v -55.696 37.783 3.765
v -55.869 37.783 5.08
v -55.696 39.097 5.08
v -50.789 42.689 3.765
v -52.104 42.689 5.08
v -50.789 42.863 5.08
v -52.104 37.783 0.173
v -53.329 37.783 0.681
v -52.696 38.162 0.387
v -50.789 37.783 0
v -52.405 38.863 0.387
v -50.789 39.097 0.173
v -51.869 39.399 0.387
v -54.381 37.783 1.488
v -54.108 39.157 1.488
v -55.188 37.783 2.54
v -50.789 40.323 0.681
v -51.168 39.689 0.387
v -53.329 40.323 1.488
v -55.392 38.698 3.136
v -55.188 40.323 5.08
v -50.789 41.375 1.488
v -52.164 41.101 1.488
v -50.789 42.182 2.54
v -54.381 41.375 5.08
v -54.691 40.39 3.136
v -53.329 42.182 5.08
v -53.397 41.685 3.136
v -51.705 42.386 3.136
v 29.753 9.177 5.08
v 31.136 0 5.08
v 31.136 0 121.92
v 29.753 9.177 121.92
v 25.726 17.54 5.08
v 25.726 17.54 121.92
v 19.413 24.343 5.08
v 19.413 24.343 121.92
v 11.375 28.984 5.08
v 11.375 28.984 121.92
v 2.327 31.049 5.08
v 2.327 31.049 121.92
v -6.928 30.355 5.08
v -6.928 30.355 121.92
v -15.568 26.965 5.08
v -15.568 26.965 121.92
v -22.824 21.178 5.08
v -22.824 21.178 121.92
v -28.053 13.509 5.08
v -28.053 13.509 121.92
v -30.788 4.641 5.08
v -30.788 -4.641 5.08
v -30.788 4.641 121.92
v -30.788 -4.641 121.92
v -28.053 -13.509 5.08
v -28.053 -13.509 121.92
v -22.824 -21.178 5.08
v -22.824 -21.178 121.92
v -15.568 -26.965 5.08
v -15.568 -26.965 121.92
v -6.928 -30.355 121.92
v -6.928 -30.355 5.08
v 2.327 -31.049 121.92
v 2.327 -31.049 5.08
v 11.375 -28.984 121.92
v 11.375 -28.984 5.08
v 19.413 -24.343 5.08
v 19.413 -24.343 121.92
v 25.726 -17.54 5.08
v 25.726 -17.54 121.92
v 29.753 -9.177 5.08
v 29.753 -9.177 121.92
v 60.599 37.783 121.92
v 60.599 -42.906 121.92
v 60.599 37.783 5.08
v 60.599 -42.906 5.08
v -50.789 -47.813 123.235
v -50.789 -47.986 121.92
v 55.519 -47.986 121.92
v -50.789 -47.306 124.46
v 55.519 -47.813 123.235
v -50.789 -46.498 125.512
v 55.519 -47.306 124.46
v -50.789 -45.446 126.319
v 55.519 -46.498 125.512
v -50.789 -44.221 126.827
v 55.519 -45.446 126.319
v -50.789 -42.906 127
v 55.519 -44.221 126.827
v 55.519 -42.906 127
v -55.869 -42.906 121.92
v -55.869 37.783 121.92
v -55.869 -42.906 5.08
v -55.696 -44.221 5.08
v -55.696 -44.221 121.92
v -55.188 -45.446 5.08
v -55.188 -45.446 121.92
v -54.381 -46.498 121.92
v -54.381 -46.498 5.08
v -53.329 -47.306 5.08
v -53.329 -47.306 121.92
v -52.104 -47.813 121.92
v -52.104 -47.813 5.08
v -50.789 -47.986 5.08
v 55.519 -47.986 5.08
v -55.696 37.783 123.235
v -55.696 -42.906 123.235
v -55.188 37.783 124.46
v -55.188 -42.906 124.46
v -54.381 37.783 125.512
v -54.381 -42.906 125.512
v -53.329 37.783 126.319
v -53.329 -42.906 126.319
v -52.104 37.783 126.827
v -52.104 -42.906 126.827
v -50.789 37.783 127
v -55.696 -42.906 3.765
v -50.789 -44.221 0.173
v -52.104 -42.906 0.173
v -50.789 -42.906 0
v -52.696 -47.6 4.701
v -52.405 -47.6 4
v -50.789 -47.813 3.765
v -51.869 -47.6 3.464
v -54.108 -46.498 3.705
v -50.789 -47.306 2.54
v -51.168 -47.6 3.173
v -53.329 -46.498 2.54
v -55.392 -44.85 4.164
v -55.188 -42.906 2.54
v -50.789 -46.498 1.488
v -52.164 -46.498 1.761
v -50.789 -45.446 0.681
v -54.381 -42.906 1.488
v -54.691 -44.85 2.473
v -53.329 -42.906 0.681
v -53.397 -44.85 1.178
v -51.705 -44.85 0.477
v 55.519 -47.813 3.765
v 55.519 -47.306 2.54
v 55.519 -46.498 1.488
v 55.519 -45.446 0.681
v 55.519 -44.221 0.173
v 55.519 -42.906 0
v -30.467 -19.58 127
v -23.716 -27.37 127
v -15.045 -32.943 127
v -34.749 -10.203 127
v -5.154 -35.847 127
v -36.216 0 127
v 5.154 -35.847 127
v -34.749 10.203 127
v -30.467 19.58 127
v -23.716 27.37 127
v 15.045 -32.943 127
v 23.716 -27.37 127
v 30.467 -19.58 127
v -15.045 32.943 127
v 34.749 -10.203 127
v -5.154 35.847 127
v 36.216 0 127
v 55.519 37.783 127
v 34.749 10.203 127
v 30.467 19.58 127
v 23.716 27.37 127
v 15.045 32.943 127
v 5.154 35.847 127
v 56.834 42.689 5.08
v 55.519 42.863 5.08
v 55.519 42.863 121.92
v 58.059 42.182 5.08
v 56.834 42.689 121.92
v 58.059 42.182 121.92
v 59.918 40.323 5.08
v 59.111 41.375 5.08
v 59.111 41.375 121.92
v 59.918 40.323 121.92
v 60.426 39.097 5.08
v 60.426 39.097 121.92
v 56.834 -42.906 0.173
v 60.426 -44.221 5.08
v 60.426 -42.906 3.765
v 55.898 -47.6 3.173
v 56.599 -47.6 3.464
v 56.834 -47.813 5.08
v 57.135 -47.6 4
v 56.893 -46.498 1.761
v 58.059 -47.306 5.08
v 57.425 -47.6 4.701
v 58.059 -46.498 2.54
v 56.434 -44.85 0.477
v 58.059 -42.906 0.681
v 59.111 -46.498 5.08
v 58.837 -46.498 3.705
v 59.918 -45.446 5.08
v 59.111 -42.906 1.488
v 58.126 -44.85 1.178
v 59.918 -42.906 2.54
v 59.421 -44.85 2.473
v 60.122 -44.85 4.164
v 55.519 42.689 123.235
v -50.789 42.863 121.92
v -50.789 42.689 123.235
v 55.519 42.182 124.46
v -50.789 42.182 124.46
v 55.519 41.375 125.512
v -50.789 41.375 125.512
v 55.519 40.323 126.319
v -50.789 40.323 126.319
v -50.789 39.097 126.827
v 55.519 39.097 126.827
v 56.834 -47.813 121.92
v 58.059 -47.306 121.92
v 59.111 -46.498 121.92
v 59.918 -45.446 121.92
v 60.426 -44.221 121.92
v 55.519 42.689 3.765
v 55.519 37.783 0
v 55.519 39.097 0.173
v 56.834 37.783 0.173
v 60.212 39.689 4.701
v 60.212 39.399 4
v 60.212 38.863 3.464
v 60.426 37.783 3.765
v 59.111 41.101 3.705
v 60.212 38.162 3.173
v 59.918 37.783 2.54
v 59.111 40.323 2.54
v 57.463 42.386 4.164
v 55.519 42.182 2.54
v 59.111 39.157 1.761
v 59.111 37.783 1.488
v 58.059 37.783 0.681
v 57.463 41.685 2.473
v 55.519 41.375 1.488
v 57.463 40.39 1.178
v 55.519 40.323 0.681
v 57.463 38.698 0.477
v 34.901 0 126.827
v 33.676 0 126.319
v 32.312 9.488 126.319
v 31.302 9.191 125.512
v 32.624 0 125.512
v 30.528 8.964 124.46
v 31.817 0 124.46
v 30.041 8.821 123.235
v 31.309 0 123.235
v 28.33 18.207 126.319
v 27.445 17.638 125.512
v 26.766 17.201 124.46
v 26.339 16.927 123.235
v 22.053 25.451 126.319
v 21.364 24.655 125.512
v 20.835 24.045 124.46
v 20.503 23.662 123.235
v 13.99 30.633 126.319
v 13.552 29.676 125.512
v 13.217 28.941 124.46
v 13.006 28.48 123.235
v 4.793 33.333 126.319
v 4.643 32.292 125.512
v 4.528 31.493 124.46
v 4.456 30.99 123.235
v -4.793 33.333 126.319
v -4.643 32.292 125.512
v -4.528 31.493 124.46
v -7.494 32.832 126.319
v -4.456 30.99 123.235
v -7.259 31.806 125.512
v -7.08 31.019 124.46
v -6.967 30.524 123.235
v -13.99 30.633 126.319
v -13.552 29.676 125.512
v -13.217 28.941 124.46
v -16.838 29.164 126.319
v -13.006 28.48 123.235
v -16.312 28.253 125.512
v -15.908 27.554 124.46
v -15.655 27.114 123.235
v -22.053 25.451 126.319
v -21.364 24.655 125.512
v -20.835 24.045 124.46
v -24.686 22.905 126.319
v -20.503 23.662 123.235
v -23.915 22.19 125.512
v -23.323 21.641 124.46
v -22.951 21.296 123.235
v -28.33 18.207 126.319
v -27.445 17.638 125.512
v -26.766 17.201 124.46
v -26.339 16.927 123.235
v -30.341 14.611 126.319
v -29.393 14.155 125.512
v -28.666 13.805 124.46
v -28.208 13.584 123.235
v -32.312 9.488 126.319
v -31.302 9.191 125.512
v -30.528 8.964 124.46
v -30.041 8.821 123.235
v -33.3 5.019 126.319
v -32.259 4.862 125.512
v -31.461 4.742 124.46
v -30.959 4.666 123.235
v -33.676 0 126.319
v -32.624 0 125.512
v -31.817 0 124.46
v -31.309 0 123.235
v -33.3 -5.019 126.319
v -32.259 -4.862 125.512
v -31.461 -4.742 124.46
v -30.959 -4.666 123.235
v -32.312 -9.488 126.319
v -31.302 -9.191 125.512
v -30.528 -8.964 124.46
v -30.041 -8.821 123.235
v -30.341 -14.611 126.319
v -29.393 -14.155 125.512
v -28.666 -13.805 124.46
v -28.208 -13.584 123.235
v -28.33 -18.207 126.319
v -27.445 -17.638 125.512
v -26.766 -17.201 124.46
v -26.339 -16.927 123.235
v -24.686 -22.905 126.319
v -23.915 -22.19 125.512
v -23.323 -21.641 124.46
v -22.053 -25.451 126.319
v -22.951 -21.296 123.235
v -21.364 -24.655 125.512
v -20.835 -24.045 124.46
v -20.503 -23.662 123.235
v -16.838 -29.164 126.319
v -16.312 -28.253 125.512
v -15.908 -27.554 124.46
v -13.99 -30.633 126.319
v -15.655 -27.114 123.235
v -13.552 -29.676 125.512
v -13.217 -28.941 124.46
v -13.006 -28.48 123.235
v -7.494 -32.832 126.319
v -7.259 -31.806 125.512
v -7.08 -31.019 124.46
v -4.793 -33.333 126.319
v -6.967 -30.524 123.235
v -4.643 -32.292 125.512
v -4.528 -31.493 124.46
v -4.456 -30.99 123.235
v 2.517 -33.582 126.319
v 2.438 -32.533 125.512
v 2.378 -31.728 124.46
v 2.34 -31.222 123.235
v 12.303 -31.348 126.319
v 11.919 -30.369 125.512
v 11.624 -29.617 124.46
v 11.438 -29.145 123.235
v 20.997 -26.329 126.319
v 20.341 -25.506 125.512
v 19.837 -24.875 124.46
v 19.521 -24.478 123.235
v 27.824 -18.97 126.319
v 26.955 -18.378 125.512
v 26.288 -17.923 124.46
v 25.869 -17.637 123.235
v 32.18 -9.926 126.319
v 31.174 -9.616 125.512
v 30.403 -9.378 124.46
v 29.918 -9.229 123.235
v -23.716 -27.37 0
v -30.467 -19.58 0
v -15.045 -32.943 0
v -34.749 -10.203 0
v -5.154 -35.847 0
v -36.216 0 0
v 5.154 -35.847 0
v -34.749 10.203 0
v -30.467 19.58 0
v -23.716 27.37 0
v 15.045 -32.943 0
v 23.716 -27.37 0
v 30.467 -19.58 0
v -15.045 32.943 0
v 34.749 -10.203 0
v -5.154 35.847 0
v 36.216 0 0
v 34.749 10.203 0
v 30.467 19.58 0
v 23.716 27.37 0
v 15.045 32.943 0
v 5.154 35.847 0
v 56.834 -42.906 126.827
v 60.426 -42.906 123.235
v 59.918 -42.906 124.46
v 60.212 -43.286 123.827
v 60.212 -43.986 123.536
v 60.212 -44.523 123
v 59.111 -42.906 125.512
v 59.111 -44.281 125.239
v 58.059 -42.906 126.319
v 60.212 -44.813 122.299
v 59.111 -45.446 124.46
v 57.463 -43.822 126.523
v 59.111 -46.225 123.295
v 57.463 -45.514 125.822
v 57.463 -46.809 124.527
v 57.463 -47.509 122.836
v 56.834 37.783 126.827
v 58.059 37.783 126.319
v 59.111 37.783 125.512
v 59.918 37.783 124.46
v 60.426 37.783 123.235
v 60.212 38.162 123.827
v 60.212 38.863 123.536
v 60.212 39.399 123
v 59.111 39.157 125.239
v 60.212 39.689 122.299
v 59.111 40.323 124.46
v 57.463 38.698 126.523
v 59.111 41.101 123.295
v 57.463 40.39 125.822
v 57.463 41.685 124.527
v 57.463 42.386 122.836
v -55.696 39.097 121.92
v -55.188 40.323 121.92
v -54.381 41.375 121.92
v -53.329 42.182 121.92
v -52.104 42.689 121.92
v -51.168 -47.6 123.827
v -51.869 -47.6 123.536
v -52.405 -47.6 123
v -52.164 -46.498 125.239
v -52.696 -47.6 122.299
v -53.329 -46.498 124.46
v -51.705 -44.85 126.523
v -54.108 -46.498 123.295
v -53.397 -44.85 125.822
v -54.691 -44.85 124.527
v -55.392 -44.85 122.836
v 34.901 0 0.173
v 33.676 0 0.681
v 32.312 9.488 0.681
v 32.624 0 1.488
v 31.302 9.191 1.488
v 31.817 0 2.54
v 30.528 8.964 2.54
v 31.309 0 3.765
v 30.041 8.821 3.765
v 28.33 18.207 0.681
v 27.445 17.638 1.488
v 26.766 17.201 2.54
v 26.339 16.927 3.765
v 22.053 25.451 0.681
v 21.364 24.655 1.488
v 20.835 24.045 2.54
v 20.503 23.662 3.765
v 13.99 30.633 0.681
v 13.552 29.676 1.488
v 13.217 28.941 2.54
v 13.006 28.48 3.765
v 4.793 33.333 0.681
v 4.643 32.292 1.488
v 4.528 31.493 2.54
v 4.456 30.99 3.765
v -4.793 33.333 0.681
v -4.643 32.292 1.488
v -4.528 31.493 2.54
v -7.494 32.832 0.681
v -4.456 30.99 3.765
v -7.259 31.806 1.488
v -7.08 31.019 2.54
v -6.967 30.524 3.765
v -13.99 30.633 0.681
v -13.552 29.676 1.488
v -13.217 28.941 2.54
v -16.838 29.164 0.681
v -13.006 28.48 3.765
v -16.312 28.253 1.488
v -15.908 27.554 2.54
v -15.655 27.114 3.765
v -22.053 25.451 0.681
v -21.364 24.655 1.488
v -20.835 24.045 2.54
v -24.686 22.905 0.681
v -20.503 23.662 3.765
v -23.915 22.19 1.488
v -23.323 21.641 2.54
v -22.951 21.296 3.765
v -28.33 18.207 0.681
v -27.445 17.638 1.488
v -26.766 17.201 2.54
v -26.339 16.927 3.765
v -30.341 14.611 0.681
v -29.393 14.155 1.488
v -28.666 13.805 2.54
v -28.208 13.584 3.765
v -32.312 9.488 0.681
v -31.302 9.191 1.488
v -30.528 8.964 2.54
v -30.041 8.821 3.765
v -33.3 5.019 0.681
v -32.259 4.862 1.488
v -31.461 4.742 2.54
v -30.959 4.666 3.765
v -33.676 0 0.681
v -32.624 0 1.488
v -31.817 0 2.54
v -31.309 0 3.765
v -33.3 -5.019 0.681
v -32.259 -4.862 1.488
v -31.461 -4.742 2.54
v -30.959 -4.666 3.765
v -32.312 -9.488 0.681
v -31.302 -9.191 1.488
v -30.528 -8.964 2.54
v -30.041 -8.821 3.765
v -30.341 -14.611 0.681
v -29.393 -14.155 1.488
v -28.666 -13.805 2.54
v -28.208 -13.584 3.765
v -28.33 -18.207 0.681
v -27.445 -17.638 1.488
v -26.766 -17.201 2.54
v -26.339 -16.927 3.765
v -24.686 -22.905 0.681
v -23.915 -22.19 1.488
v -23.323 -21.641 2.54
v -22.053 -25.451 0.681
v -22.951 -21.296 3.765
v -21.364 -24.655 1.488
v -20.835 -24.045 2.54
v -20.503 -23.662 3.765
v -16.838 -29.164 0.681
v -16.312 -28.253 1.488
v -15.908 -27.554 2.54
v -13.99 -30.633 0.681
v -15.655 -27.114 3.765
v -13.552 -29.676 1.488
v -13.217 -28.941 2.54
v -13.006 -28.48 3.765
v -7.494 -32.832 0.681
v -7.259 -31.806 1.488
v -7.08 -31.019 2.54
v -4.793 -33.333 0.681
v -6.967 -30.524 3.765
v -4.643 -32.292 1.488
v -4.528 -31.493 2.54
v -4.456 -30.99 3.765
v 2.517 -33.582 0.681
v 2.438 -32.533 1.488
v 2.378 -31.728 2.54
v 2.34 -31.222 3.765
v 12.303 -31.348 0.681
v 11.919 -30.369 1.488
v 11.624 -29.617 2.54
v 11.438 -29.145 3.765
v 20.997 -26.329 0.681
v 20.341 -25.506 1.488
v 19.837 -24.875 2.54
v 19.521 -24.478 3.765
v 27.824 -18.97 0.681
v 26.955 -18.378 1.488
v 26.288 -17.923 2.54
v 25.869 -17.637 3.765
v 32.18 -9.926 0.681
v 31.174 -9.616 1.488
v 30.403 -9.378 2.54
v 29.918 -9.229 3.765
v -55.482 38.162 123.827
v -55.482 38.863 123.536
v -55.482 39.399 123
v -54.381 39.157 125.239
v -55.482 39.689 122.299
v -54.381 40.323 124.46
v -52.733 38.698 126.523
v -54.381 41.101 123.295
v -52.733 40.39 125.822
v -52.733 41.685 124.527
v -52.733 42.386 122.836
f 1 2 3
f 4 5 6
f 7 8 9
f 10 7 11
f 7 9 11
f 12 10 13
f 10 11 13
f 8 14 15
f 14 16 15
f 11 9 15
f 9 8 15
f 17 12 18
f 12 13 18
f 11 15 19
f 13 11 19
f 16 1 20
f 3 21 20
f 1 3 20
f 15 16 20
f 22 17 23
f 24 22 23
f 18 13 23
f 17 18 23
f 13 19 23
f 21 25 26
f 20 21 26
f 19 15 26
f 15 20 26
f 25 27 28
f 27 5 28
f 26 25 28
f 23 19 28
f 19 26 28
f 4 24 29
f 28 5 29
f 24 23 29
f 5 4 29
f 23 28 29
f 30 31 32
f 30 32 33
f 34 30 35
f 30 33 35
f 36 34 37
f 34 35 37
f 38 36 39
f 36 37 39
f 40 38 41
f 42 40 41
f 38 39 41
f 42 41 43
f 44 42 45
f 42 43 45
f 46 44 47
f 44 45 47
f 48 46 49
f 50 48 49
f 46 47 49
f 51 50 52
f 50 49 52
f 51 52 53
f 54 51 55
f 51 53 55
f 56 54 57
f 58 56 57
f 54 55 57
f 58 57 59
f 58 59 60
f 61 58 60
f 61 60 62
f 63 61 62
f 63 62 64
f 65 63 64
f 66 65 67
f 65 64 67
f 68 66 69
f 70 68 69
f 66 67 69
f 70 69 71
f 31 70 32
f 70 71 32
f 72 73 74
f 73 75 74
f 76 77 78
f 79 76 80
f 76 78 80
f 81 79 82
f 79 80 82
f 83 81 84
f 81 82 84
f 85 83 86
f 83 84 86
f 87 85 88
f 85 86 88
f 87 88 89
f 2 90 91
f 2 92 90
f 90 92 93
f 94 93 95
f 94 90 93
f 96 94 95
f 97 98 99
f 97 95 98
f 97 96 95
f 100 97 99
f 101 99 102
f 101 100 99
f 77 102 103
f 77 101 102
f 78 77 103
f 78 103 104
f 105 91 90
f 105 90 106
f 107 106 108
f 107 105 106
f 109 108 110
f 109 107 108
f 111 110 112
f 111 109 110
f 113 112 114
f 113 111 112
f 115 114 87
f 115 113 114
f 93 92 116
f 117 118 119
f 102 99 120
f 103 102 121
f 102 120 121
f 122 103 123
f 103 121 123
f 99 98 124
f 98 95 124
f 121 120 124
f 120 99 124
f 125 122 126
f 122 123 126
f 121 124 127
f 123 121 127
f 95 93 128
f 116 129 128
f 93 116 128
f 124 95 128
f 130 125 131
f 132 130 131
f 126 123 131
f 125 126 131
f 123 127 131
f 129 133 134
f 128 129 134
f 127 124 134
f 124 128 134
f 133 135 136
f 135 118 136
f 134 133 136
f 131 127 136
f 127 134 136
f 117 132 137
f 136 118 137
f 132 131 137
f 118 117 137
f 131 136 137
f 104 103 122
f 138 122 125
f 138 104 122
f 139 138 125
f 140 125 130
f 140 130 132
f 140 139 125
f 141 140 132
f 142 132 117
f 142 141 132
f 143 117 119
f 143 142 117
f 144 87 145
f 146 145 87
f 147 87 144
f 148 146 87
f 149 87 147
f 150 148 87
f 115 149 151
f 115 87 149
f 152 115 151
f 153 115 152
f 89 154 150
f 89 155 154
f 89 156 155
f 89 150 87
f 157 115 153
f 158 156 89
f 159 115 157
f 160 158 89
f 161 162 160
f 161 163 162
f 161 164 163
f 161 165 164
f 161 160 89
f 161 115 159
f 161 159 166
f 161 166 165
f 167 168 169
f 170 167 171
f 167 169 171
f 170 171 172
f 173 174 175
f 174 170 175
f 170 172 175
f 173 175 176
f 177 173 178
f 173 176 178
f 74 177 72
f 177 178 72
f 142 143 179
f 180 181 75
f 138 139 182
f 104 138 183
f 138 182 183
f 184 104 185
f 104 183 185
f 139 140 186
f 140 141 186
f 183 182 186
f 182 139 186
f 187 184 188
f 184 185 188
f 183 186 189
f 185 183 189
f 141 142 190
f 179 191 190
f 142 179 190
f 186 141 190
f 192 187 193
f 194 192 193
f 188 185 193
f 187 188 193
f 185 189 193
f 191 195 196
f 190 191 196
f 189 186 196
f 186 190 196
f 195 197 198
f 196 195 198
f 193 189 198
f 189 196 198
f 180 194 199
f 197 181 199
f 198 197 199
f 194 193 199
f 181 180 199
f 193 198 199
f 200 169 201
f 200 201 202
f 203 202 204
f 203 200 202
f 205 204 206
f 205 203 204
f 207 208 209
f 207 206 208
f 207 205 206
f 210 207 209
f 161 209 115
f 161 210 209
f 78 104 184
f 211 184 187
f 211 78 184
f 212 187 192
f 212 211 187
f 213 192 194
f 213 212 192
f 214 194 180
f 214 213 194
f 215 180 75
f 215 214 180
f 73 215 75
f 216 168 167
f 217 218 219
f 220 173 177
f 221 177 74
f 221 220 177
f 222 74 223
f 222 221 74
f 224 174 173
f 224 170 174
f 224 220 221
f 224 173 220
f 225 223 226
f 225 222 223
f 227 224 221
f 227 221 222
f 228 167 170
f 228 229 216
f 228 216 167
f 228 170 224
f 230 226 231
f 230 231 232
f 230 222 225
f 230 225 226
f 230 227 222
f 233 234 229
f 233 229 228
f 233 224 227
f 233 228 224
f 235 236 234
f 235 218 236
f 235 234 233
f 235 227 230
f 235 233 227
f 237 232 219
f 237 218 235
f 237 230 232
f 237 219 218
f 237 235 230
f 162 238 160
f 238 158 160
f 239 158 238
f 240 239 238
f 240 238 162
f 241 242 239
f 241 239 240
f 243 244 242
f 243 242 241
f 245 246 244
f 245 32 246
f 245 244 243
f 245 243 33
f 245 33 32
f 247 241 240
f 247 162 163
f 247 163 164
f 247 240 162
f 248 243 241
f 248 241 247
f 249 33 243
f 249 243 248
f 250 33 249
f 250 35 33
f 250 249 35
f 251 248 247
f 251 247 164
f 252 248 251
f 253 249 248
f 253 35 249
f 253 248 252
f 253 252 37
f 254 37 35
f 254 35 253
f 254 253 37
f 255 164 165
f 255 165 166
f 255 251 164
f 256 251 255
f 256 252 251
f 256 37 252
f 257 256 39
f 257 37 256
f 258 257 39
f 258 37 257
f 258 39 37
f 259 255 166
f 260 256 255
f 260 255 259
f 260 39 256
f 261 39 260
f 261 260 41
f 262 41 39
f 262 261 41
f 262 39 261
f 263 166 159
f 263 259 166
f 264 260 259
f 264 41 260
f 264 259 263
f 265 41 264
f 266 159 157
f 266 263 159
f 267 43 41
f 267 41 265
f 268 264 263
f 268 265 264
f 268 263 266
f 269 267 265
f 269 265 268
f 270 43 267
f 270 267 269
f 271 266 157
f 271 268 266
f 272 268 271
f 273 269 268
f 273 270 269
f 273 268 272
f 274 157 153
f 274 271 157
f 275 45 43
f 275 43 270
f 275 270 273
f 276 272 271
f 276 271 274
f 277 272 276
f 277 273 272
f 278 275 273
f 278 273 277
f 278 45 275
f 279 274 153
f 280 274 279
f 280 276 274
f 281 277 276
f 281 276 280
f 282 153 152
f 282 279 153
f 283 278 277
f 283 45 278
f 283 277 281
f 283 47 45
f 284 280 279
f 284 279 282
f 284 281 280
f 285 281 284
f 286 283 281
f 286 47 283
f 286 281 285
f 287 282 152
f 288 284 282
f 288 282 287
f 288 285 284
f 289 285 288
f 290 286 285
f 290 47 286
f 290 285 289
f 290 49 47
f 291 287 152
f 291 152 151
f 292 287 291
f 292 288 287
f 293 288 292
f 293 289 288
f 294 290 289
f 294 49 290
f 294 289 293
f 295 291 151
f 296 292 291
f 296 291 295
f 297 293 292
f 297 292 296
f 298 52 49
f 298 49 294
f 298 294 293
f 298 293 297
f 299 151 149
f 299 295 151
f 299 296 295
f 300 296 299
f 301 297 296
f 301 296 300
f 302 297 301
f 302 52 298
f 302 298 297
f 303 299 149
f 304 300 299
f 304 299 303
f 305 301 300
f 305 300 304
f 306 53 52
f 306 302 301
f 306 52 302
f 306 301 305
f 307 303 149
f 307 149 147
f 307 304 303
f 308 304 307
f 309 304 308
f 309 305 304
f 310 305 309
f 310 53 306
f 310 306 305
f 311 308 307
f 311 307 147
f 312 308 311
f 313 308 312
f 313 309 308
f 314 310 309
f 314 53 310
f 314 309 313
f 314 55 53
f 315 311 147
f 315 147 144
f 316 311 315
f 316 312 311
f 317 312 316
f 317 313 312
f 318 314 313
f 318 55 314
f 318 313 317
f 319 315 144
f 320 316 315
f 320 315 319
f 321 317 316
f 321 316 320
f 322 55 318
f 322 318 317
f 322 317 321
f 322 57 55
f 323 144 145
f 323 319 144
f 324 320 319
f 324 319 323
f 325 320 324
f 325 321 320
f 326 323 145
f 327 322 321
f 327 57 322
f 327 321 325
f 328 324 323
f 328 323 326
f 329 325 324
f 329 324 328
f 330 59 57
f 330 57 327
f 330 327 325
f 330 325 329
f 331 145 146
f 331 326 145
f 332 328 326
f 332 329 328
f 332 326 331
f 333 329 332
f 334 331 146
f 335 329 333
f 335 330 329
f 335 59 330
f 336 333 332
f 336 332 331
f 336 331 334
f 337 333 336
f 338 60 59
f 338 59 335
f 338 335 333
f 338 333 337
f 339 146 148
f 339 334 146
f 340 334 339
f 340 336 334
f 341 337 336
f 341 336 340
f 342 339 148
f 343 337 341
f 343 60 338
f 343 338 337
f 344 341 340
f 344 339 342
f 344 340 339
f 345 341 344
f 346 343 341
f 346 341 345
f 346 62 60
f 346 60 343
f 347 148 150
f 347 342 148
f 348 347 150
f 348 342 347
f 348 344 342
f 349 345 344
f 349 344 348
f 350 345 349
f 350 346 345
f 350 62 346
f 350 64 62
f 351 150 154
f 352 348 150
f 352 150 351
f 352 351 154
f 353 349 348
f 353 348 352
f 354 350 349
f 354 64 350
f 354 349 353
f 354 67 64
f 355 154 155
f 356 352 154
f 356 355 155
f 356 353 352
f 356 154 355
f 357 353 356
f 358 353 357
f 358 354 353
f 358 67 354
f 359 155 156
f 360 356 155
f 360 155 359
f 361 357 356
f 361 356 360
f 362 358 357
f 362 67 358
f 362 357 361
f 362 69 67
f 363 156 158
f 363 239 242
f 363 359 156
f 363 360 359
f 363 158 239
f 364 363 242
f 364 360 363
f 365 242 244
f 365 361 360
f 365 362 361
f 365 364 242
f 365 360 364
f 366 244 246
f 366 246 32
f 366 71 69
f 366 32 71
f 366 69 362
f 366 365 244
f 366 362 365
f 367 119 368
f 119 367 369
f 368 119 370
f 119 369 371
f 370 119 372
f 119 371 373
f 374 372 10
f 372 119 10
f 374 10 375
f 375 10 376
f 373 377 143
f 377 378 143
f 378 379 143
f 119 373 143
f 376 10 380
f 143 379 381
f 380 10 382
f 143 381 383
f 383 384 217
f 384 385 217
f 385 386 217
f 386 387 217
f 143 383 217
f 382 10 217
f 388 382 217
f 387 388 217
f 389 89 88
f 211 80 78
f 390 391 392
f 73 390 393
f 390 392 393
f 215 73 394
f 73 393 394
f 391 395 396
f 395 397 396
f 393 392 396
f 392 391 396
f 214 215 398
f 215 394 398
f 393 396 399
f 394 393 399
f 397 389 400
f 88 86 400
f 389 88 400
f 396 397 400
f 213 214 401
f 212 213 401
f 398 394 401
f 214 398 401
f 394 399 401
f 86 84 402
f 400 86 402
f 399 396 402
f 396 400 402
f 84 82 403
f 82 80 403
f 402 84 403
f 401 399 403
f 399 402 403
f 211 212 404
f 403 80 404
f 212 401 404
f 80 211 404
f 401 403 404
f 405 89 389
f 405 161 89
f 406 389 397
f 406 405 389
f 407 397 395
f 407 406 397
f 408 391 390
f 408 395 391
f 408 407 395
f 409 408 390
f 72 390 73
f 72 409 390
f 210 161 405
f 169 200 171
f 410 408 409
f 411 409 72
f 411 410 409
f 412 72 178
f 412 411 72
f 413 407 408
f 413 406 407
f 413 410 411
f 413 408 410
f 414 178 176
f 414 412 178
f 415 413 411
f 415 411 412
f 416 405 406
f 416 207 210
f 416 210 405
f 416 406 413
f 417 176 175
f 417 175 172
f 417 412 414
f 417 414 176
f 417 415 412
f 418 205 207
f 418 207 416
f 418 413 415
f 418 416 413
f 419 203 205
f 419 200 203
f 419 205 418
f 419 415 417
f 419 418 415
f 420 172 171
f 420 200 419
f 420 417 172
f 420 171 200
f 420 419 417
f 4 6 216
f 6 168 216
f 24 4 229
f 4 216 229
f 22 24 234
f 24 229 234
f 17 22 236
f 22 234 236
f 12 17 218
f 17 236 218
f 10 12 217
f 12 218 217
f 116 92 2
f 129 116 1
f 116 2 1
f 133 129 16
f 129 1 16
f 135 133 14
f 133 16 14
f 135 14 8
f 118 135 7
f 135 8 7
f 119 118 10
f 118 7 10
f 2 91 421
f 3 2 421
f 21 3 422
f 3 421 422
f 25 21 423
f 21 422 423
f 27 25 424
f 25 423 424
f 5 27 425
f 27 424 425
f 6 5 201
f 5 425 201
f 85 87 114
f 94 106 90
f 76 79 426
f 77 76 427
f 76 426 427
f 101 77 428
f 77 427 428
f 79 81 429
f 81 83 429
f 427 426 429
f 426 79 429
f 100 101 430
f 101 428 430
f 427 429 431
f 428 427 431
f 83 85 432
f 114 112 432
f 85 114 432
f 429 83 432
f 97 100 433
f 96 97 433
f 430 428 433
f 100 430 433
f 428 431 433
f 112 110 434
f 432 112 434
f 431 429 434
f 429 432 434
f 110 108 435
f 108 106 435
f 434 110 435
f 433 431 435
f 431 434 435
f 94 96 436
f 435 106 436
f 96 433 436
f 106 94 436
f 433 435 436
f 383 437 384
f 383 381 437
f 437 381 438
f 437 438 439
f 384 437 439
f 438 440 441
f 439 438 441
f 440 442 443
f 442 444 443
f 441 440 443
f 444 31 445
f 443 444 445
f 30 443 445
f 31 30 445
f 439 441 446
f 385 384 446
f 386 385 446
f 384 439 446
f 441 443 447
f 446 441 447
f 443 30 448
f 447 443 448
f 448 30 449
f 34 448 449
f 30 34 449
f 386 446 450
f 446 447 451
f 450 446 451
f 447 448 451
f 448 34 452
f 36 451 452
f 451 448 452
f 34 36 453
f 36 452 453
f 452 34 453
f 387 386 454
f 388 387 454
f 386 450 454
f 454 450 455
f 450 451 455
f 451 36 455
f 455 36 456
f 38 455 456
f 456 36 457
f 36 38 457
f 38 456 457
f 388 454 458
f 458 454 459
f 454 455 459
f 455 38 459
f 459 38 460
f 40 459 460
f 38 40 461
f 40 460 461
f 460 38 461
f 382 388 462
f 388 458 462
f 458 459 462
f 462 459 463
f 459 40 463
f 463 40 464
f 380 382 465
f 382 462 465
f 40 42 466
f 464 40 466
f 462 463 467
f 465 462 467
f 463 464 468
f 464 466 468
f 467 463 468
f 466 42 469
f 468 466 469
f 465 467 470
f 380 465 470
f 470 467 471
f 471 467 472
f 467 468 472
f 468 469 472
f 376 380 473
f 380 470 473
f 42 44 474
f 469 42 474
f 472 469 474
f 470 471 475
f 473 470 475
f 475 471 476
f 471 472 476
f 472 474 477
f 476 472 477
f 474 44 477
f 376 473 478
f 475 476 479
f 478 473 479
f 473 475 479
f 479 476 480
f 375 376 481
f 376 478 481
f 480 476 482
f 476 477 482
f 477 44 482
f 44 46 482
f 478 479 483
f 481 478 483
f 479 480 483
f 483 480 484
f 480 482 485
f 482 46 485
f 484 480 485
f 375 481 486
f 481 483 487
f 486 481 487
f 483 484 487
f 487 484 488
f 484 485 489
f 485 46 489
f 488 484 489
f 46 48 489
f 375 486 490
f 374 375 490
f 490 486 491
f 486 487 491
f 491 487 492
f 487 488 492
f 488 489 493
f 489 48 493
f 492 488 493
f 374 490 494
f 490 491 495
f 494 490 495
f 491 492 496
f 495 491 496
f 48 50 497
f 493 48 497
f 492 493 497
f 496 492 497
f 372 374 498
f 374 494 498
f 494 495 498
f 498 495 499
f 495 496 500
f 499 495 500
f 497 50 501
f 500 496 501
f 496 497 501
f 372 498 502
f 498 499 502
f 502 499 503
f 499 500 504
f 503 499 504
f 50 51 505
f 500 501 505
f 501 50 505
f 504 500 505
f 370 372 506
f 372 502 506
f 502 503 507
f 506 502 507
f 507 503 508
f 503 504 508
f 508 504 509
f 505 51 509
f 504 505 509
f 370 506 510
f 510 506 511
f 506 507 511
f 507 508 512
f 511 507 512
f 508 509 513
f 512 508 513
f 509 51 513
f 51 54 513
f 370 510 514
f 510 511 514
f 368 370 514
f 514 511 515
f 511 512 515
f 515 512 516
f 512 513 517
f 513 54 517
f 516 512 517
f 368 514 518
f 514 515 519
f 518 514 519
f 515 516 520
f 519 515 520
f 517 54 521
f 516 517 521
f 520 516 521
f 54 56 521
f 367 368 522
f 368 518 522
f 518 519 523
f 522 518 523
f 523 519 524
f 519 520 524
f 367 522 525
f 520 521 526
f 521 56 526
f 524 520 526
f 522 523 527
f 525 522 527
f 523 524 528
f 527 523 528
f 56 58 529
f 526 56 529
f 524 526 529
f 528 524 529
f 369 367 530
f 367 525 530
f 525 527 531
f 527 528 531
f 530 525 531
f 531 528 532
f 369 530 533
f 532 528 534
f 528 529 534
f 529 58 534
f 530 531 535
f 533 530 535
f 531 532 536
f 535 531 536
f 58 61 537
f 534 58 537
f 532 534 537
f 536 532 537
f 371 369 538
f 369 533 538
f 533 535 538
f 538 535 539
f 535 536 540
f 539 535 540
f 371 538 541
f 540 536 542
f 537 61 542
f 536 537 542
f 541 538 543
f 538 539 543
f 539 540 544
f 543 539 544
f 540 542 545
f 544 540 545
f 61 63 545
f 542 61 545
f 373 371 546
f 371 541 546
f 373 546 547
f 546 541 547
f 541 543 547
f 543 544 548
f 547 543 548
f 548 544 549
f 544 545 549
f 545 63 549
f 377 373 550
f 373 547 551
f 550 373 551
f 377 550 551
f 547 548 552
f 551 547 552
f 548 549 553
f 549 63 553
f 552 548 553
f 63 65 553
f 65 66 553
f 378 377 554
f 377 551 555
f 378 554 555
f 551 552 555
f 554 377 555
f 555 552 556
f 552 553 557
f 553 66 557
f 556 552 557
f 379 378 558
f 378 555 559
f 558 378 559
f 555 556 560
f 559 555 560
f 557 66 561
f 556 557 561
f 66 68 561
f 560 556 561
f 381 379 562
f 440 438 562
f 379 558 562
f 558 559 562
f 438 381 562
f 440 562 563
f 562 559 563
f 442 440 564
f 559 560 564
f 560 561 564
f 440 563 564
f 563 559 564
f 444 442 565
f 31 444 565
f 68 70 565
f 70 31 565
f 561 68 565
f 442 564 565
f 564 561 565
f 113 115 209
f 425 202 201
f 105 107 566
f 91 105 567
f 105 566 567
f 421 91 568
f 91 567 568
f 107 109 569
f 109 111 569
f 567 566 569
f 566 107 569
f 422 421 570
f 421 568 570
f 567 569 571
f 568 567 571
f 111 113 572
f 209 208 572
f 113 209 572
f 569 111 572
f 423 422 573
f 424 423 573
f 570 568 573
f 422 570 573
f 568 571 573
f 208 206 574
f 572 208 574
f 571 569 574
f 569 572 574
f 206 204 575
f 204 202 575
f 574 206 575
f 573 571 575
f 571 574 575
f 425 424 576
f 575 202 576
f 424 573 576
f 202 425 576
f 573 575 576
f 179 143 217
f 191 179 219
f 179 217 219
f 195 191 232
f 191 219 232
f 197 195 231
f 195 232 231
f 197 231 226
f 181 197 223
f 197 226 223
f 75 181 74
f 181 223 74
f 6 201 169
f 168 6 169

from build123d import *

# Parameters (mm, degrees)
F0_W     = 116.467763
F0_H     = 90.848792
F1_DEPTH = 127
F2_R     = 31.135963
F3_DEPTH = 127
F4_R     = 5.08


with BuildPart() as f1:
    # F0 (on Top) → F1 (new body)
    with BuildSketch(Plane.XY):
        with Locations((2.364828, -2.561895)):
            Rectangle(F0_W, F0_H)
    extrude(amount=F1_DEPTH)

    # F2 (on face) → F3 (cut)
    with BuildSketch(Plane.XY.offset(127)):
        Circle(F2_R)
    extrude(amount=-F3_DEPTH, mode=Mode.SUBTRACT)

    # F4
    f4_edges = [f1.edges().sort_by_distance(p)[0] for p in [
        (2.364827, 42.862501, 127),
        (-55.869054, -2.561895, 127),
        (2.364827, -47.986291, 127),
        (60.598709, -2.561895, 127),
        (-31.135963, 0, 127),
        (-55.869054, 42.862501, 63.5),
        (-55.869054, -2.561895, 0),
        (-55.869054, -47.986291, 63.5),
        (2.364827, 42.862501, 0),
        (60.598709, 42.862501, 63.5),
        (31.135963, 0, 63.5),
        (-31.135963, 0, 0),
        (60.598709, -2.561895, 0),
        (2.364827, -47.986291, 0),
        (60.598709, -47.986291, 63.5),
    ]]
    fillet(f4_edges, radius=F4_R)


solid = f1.part
